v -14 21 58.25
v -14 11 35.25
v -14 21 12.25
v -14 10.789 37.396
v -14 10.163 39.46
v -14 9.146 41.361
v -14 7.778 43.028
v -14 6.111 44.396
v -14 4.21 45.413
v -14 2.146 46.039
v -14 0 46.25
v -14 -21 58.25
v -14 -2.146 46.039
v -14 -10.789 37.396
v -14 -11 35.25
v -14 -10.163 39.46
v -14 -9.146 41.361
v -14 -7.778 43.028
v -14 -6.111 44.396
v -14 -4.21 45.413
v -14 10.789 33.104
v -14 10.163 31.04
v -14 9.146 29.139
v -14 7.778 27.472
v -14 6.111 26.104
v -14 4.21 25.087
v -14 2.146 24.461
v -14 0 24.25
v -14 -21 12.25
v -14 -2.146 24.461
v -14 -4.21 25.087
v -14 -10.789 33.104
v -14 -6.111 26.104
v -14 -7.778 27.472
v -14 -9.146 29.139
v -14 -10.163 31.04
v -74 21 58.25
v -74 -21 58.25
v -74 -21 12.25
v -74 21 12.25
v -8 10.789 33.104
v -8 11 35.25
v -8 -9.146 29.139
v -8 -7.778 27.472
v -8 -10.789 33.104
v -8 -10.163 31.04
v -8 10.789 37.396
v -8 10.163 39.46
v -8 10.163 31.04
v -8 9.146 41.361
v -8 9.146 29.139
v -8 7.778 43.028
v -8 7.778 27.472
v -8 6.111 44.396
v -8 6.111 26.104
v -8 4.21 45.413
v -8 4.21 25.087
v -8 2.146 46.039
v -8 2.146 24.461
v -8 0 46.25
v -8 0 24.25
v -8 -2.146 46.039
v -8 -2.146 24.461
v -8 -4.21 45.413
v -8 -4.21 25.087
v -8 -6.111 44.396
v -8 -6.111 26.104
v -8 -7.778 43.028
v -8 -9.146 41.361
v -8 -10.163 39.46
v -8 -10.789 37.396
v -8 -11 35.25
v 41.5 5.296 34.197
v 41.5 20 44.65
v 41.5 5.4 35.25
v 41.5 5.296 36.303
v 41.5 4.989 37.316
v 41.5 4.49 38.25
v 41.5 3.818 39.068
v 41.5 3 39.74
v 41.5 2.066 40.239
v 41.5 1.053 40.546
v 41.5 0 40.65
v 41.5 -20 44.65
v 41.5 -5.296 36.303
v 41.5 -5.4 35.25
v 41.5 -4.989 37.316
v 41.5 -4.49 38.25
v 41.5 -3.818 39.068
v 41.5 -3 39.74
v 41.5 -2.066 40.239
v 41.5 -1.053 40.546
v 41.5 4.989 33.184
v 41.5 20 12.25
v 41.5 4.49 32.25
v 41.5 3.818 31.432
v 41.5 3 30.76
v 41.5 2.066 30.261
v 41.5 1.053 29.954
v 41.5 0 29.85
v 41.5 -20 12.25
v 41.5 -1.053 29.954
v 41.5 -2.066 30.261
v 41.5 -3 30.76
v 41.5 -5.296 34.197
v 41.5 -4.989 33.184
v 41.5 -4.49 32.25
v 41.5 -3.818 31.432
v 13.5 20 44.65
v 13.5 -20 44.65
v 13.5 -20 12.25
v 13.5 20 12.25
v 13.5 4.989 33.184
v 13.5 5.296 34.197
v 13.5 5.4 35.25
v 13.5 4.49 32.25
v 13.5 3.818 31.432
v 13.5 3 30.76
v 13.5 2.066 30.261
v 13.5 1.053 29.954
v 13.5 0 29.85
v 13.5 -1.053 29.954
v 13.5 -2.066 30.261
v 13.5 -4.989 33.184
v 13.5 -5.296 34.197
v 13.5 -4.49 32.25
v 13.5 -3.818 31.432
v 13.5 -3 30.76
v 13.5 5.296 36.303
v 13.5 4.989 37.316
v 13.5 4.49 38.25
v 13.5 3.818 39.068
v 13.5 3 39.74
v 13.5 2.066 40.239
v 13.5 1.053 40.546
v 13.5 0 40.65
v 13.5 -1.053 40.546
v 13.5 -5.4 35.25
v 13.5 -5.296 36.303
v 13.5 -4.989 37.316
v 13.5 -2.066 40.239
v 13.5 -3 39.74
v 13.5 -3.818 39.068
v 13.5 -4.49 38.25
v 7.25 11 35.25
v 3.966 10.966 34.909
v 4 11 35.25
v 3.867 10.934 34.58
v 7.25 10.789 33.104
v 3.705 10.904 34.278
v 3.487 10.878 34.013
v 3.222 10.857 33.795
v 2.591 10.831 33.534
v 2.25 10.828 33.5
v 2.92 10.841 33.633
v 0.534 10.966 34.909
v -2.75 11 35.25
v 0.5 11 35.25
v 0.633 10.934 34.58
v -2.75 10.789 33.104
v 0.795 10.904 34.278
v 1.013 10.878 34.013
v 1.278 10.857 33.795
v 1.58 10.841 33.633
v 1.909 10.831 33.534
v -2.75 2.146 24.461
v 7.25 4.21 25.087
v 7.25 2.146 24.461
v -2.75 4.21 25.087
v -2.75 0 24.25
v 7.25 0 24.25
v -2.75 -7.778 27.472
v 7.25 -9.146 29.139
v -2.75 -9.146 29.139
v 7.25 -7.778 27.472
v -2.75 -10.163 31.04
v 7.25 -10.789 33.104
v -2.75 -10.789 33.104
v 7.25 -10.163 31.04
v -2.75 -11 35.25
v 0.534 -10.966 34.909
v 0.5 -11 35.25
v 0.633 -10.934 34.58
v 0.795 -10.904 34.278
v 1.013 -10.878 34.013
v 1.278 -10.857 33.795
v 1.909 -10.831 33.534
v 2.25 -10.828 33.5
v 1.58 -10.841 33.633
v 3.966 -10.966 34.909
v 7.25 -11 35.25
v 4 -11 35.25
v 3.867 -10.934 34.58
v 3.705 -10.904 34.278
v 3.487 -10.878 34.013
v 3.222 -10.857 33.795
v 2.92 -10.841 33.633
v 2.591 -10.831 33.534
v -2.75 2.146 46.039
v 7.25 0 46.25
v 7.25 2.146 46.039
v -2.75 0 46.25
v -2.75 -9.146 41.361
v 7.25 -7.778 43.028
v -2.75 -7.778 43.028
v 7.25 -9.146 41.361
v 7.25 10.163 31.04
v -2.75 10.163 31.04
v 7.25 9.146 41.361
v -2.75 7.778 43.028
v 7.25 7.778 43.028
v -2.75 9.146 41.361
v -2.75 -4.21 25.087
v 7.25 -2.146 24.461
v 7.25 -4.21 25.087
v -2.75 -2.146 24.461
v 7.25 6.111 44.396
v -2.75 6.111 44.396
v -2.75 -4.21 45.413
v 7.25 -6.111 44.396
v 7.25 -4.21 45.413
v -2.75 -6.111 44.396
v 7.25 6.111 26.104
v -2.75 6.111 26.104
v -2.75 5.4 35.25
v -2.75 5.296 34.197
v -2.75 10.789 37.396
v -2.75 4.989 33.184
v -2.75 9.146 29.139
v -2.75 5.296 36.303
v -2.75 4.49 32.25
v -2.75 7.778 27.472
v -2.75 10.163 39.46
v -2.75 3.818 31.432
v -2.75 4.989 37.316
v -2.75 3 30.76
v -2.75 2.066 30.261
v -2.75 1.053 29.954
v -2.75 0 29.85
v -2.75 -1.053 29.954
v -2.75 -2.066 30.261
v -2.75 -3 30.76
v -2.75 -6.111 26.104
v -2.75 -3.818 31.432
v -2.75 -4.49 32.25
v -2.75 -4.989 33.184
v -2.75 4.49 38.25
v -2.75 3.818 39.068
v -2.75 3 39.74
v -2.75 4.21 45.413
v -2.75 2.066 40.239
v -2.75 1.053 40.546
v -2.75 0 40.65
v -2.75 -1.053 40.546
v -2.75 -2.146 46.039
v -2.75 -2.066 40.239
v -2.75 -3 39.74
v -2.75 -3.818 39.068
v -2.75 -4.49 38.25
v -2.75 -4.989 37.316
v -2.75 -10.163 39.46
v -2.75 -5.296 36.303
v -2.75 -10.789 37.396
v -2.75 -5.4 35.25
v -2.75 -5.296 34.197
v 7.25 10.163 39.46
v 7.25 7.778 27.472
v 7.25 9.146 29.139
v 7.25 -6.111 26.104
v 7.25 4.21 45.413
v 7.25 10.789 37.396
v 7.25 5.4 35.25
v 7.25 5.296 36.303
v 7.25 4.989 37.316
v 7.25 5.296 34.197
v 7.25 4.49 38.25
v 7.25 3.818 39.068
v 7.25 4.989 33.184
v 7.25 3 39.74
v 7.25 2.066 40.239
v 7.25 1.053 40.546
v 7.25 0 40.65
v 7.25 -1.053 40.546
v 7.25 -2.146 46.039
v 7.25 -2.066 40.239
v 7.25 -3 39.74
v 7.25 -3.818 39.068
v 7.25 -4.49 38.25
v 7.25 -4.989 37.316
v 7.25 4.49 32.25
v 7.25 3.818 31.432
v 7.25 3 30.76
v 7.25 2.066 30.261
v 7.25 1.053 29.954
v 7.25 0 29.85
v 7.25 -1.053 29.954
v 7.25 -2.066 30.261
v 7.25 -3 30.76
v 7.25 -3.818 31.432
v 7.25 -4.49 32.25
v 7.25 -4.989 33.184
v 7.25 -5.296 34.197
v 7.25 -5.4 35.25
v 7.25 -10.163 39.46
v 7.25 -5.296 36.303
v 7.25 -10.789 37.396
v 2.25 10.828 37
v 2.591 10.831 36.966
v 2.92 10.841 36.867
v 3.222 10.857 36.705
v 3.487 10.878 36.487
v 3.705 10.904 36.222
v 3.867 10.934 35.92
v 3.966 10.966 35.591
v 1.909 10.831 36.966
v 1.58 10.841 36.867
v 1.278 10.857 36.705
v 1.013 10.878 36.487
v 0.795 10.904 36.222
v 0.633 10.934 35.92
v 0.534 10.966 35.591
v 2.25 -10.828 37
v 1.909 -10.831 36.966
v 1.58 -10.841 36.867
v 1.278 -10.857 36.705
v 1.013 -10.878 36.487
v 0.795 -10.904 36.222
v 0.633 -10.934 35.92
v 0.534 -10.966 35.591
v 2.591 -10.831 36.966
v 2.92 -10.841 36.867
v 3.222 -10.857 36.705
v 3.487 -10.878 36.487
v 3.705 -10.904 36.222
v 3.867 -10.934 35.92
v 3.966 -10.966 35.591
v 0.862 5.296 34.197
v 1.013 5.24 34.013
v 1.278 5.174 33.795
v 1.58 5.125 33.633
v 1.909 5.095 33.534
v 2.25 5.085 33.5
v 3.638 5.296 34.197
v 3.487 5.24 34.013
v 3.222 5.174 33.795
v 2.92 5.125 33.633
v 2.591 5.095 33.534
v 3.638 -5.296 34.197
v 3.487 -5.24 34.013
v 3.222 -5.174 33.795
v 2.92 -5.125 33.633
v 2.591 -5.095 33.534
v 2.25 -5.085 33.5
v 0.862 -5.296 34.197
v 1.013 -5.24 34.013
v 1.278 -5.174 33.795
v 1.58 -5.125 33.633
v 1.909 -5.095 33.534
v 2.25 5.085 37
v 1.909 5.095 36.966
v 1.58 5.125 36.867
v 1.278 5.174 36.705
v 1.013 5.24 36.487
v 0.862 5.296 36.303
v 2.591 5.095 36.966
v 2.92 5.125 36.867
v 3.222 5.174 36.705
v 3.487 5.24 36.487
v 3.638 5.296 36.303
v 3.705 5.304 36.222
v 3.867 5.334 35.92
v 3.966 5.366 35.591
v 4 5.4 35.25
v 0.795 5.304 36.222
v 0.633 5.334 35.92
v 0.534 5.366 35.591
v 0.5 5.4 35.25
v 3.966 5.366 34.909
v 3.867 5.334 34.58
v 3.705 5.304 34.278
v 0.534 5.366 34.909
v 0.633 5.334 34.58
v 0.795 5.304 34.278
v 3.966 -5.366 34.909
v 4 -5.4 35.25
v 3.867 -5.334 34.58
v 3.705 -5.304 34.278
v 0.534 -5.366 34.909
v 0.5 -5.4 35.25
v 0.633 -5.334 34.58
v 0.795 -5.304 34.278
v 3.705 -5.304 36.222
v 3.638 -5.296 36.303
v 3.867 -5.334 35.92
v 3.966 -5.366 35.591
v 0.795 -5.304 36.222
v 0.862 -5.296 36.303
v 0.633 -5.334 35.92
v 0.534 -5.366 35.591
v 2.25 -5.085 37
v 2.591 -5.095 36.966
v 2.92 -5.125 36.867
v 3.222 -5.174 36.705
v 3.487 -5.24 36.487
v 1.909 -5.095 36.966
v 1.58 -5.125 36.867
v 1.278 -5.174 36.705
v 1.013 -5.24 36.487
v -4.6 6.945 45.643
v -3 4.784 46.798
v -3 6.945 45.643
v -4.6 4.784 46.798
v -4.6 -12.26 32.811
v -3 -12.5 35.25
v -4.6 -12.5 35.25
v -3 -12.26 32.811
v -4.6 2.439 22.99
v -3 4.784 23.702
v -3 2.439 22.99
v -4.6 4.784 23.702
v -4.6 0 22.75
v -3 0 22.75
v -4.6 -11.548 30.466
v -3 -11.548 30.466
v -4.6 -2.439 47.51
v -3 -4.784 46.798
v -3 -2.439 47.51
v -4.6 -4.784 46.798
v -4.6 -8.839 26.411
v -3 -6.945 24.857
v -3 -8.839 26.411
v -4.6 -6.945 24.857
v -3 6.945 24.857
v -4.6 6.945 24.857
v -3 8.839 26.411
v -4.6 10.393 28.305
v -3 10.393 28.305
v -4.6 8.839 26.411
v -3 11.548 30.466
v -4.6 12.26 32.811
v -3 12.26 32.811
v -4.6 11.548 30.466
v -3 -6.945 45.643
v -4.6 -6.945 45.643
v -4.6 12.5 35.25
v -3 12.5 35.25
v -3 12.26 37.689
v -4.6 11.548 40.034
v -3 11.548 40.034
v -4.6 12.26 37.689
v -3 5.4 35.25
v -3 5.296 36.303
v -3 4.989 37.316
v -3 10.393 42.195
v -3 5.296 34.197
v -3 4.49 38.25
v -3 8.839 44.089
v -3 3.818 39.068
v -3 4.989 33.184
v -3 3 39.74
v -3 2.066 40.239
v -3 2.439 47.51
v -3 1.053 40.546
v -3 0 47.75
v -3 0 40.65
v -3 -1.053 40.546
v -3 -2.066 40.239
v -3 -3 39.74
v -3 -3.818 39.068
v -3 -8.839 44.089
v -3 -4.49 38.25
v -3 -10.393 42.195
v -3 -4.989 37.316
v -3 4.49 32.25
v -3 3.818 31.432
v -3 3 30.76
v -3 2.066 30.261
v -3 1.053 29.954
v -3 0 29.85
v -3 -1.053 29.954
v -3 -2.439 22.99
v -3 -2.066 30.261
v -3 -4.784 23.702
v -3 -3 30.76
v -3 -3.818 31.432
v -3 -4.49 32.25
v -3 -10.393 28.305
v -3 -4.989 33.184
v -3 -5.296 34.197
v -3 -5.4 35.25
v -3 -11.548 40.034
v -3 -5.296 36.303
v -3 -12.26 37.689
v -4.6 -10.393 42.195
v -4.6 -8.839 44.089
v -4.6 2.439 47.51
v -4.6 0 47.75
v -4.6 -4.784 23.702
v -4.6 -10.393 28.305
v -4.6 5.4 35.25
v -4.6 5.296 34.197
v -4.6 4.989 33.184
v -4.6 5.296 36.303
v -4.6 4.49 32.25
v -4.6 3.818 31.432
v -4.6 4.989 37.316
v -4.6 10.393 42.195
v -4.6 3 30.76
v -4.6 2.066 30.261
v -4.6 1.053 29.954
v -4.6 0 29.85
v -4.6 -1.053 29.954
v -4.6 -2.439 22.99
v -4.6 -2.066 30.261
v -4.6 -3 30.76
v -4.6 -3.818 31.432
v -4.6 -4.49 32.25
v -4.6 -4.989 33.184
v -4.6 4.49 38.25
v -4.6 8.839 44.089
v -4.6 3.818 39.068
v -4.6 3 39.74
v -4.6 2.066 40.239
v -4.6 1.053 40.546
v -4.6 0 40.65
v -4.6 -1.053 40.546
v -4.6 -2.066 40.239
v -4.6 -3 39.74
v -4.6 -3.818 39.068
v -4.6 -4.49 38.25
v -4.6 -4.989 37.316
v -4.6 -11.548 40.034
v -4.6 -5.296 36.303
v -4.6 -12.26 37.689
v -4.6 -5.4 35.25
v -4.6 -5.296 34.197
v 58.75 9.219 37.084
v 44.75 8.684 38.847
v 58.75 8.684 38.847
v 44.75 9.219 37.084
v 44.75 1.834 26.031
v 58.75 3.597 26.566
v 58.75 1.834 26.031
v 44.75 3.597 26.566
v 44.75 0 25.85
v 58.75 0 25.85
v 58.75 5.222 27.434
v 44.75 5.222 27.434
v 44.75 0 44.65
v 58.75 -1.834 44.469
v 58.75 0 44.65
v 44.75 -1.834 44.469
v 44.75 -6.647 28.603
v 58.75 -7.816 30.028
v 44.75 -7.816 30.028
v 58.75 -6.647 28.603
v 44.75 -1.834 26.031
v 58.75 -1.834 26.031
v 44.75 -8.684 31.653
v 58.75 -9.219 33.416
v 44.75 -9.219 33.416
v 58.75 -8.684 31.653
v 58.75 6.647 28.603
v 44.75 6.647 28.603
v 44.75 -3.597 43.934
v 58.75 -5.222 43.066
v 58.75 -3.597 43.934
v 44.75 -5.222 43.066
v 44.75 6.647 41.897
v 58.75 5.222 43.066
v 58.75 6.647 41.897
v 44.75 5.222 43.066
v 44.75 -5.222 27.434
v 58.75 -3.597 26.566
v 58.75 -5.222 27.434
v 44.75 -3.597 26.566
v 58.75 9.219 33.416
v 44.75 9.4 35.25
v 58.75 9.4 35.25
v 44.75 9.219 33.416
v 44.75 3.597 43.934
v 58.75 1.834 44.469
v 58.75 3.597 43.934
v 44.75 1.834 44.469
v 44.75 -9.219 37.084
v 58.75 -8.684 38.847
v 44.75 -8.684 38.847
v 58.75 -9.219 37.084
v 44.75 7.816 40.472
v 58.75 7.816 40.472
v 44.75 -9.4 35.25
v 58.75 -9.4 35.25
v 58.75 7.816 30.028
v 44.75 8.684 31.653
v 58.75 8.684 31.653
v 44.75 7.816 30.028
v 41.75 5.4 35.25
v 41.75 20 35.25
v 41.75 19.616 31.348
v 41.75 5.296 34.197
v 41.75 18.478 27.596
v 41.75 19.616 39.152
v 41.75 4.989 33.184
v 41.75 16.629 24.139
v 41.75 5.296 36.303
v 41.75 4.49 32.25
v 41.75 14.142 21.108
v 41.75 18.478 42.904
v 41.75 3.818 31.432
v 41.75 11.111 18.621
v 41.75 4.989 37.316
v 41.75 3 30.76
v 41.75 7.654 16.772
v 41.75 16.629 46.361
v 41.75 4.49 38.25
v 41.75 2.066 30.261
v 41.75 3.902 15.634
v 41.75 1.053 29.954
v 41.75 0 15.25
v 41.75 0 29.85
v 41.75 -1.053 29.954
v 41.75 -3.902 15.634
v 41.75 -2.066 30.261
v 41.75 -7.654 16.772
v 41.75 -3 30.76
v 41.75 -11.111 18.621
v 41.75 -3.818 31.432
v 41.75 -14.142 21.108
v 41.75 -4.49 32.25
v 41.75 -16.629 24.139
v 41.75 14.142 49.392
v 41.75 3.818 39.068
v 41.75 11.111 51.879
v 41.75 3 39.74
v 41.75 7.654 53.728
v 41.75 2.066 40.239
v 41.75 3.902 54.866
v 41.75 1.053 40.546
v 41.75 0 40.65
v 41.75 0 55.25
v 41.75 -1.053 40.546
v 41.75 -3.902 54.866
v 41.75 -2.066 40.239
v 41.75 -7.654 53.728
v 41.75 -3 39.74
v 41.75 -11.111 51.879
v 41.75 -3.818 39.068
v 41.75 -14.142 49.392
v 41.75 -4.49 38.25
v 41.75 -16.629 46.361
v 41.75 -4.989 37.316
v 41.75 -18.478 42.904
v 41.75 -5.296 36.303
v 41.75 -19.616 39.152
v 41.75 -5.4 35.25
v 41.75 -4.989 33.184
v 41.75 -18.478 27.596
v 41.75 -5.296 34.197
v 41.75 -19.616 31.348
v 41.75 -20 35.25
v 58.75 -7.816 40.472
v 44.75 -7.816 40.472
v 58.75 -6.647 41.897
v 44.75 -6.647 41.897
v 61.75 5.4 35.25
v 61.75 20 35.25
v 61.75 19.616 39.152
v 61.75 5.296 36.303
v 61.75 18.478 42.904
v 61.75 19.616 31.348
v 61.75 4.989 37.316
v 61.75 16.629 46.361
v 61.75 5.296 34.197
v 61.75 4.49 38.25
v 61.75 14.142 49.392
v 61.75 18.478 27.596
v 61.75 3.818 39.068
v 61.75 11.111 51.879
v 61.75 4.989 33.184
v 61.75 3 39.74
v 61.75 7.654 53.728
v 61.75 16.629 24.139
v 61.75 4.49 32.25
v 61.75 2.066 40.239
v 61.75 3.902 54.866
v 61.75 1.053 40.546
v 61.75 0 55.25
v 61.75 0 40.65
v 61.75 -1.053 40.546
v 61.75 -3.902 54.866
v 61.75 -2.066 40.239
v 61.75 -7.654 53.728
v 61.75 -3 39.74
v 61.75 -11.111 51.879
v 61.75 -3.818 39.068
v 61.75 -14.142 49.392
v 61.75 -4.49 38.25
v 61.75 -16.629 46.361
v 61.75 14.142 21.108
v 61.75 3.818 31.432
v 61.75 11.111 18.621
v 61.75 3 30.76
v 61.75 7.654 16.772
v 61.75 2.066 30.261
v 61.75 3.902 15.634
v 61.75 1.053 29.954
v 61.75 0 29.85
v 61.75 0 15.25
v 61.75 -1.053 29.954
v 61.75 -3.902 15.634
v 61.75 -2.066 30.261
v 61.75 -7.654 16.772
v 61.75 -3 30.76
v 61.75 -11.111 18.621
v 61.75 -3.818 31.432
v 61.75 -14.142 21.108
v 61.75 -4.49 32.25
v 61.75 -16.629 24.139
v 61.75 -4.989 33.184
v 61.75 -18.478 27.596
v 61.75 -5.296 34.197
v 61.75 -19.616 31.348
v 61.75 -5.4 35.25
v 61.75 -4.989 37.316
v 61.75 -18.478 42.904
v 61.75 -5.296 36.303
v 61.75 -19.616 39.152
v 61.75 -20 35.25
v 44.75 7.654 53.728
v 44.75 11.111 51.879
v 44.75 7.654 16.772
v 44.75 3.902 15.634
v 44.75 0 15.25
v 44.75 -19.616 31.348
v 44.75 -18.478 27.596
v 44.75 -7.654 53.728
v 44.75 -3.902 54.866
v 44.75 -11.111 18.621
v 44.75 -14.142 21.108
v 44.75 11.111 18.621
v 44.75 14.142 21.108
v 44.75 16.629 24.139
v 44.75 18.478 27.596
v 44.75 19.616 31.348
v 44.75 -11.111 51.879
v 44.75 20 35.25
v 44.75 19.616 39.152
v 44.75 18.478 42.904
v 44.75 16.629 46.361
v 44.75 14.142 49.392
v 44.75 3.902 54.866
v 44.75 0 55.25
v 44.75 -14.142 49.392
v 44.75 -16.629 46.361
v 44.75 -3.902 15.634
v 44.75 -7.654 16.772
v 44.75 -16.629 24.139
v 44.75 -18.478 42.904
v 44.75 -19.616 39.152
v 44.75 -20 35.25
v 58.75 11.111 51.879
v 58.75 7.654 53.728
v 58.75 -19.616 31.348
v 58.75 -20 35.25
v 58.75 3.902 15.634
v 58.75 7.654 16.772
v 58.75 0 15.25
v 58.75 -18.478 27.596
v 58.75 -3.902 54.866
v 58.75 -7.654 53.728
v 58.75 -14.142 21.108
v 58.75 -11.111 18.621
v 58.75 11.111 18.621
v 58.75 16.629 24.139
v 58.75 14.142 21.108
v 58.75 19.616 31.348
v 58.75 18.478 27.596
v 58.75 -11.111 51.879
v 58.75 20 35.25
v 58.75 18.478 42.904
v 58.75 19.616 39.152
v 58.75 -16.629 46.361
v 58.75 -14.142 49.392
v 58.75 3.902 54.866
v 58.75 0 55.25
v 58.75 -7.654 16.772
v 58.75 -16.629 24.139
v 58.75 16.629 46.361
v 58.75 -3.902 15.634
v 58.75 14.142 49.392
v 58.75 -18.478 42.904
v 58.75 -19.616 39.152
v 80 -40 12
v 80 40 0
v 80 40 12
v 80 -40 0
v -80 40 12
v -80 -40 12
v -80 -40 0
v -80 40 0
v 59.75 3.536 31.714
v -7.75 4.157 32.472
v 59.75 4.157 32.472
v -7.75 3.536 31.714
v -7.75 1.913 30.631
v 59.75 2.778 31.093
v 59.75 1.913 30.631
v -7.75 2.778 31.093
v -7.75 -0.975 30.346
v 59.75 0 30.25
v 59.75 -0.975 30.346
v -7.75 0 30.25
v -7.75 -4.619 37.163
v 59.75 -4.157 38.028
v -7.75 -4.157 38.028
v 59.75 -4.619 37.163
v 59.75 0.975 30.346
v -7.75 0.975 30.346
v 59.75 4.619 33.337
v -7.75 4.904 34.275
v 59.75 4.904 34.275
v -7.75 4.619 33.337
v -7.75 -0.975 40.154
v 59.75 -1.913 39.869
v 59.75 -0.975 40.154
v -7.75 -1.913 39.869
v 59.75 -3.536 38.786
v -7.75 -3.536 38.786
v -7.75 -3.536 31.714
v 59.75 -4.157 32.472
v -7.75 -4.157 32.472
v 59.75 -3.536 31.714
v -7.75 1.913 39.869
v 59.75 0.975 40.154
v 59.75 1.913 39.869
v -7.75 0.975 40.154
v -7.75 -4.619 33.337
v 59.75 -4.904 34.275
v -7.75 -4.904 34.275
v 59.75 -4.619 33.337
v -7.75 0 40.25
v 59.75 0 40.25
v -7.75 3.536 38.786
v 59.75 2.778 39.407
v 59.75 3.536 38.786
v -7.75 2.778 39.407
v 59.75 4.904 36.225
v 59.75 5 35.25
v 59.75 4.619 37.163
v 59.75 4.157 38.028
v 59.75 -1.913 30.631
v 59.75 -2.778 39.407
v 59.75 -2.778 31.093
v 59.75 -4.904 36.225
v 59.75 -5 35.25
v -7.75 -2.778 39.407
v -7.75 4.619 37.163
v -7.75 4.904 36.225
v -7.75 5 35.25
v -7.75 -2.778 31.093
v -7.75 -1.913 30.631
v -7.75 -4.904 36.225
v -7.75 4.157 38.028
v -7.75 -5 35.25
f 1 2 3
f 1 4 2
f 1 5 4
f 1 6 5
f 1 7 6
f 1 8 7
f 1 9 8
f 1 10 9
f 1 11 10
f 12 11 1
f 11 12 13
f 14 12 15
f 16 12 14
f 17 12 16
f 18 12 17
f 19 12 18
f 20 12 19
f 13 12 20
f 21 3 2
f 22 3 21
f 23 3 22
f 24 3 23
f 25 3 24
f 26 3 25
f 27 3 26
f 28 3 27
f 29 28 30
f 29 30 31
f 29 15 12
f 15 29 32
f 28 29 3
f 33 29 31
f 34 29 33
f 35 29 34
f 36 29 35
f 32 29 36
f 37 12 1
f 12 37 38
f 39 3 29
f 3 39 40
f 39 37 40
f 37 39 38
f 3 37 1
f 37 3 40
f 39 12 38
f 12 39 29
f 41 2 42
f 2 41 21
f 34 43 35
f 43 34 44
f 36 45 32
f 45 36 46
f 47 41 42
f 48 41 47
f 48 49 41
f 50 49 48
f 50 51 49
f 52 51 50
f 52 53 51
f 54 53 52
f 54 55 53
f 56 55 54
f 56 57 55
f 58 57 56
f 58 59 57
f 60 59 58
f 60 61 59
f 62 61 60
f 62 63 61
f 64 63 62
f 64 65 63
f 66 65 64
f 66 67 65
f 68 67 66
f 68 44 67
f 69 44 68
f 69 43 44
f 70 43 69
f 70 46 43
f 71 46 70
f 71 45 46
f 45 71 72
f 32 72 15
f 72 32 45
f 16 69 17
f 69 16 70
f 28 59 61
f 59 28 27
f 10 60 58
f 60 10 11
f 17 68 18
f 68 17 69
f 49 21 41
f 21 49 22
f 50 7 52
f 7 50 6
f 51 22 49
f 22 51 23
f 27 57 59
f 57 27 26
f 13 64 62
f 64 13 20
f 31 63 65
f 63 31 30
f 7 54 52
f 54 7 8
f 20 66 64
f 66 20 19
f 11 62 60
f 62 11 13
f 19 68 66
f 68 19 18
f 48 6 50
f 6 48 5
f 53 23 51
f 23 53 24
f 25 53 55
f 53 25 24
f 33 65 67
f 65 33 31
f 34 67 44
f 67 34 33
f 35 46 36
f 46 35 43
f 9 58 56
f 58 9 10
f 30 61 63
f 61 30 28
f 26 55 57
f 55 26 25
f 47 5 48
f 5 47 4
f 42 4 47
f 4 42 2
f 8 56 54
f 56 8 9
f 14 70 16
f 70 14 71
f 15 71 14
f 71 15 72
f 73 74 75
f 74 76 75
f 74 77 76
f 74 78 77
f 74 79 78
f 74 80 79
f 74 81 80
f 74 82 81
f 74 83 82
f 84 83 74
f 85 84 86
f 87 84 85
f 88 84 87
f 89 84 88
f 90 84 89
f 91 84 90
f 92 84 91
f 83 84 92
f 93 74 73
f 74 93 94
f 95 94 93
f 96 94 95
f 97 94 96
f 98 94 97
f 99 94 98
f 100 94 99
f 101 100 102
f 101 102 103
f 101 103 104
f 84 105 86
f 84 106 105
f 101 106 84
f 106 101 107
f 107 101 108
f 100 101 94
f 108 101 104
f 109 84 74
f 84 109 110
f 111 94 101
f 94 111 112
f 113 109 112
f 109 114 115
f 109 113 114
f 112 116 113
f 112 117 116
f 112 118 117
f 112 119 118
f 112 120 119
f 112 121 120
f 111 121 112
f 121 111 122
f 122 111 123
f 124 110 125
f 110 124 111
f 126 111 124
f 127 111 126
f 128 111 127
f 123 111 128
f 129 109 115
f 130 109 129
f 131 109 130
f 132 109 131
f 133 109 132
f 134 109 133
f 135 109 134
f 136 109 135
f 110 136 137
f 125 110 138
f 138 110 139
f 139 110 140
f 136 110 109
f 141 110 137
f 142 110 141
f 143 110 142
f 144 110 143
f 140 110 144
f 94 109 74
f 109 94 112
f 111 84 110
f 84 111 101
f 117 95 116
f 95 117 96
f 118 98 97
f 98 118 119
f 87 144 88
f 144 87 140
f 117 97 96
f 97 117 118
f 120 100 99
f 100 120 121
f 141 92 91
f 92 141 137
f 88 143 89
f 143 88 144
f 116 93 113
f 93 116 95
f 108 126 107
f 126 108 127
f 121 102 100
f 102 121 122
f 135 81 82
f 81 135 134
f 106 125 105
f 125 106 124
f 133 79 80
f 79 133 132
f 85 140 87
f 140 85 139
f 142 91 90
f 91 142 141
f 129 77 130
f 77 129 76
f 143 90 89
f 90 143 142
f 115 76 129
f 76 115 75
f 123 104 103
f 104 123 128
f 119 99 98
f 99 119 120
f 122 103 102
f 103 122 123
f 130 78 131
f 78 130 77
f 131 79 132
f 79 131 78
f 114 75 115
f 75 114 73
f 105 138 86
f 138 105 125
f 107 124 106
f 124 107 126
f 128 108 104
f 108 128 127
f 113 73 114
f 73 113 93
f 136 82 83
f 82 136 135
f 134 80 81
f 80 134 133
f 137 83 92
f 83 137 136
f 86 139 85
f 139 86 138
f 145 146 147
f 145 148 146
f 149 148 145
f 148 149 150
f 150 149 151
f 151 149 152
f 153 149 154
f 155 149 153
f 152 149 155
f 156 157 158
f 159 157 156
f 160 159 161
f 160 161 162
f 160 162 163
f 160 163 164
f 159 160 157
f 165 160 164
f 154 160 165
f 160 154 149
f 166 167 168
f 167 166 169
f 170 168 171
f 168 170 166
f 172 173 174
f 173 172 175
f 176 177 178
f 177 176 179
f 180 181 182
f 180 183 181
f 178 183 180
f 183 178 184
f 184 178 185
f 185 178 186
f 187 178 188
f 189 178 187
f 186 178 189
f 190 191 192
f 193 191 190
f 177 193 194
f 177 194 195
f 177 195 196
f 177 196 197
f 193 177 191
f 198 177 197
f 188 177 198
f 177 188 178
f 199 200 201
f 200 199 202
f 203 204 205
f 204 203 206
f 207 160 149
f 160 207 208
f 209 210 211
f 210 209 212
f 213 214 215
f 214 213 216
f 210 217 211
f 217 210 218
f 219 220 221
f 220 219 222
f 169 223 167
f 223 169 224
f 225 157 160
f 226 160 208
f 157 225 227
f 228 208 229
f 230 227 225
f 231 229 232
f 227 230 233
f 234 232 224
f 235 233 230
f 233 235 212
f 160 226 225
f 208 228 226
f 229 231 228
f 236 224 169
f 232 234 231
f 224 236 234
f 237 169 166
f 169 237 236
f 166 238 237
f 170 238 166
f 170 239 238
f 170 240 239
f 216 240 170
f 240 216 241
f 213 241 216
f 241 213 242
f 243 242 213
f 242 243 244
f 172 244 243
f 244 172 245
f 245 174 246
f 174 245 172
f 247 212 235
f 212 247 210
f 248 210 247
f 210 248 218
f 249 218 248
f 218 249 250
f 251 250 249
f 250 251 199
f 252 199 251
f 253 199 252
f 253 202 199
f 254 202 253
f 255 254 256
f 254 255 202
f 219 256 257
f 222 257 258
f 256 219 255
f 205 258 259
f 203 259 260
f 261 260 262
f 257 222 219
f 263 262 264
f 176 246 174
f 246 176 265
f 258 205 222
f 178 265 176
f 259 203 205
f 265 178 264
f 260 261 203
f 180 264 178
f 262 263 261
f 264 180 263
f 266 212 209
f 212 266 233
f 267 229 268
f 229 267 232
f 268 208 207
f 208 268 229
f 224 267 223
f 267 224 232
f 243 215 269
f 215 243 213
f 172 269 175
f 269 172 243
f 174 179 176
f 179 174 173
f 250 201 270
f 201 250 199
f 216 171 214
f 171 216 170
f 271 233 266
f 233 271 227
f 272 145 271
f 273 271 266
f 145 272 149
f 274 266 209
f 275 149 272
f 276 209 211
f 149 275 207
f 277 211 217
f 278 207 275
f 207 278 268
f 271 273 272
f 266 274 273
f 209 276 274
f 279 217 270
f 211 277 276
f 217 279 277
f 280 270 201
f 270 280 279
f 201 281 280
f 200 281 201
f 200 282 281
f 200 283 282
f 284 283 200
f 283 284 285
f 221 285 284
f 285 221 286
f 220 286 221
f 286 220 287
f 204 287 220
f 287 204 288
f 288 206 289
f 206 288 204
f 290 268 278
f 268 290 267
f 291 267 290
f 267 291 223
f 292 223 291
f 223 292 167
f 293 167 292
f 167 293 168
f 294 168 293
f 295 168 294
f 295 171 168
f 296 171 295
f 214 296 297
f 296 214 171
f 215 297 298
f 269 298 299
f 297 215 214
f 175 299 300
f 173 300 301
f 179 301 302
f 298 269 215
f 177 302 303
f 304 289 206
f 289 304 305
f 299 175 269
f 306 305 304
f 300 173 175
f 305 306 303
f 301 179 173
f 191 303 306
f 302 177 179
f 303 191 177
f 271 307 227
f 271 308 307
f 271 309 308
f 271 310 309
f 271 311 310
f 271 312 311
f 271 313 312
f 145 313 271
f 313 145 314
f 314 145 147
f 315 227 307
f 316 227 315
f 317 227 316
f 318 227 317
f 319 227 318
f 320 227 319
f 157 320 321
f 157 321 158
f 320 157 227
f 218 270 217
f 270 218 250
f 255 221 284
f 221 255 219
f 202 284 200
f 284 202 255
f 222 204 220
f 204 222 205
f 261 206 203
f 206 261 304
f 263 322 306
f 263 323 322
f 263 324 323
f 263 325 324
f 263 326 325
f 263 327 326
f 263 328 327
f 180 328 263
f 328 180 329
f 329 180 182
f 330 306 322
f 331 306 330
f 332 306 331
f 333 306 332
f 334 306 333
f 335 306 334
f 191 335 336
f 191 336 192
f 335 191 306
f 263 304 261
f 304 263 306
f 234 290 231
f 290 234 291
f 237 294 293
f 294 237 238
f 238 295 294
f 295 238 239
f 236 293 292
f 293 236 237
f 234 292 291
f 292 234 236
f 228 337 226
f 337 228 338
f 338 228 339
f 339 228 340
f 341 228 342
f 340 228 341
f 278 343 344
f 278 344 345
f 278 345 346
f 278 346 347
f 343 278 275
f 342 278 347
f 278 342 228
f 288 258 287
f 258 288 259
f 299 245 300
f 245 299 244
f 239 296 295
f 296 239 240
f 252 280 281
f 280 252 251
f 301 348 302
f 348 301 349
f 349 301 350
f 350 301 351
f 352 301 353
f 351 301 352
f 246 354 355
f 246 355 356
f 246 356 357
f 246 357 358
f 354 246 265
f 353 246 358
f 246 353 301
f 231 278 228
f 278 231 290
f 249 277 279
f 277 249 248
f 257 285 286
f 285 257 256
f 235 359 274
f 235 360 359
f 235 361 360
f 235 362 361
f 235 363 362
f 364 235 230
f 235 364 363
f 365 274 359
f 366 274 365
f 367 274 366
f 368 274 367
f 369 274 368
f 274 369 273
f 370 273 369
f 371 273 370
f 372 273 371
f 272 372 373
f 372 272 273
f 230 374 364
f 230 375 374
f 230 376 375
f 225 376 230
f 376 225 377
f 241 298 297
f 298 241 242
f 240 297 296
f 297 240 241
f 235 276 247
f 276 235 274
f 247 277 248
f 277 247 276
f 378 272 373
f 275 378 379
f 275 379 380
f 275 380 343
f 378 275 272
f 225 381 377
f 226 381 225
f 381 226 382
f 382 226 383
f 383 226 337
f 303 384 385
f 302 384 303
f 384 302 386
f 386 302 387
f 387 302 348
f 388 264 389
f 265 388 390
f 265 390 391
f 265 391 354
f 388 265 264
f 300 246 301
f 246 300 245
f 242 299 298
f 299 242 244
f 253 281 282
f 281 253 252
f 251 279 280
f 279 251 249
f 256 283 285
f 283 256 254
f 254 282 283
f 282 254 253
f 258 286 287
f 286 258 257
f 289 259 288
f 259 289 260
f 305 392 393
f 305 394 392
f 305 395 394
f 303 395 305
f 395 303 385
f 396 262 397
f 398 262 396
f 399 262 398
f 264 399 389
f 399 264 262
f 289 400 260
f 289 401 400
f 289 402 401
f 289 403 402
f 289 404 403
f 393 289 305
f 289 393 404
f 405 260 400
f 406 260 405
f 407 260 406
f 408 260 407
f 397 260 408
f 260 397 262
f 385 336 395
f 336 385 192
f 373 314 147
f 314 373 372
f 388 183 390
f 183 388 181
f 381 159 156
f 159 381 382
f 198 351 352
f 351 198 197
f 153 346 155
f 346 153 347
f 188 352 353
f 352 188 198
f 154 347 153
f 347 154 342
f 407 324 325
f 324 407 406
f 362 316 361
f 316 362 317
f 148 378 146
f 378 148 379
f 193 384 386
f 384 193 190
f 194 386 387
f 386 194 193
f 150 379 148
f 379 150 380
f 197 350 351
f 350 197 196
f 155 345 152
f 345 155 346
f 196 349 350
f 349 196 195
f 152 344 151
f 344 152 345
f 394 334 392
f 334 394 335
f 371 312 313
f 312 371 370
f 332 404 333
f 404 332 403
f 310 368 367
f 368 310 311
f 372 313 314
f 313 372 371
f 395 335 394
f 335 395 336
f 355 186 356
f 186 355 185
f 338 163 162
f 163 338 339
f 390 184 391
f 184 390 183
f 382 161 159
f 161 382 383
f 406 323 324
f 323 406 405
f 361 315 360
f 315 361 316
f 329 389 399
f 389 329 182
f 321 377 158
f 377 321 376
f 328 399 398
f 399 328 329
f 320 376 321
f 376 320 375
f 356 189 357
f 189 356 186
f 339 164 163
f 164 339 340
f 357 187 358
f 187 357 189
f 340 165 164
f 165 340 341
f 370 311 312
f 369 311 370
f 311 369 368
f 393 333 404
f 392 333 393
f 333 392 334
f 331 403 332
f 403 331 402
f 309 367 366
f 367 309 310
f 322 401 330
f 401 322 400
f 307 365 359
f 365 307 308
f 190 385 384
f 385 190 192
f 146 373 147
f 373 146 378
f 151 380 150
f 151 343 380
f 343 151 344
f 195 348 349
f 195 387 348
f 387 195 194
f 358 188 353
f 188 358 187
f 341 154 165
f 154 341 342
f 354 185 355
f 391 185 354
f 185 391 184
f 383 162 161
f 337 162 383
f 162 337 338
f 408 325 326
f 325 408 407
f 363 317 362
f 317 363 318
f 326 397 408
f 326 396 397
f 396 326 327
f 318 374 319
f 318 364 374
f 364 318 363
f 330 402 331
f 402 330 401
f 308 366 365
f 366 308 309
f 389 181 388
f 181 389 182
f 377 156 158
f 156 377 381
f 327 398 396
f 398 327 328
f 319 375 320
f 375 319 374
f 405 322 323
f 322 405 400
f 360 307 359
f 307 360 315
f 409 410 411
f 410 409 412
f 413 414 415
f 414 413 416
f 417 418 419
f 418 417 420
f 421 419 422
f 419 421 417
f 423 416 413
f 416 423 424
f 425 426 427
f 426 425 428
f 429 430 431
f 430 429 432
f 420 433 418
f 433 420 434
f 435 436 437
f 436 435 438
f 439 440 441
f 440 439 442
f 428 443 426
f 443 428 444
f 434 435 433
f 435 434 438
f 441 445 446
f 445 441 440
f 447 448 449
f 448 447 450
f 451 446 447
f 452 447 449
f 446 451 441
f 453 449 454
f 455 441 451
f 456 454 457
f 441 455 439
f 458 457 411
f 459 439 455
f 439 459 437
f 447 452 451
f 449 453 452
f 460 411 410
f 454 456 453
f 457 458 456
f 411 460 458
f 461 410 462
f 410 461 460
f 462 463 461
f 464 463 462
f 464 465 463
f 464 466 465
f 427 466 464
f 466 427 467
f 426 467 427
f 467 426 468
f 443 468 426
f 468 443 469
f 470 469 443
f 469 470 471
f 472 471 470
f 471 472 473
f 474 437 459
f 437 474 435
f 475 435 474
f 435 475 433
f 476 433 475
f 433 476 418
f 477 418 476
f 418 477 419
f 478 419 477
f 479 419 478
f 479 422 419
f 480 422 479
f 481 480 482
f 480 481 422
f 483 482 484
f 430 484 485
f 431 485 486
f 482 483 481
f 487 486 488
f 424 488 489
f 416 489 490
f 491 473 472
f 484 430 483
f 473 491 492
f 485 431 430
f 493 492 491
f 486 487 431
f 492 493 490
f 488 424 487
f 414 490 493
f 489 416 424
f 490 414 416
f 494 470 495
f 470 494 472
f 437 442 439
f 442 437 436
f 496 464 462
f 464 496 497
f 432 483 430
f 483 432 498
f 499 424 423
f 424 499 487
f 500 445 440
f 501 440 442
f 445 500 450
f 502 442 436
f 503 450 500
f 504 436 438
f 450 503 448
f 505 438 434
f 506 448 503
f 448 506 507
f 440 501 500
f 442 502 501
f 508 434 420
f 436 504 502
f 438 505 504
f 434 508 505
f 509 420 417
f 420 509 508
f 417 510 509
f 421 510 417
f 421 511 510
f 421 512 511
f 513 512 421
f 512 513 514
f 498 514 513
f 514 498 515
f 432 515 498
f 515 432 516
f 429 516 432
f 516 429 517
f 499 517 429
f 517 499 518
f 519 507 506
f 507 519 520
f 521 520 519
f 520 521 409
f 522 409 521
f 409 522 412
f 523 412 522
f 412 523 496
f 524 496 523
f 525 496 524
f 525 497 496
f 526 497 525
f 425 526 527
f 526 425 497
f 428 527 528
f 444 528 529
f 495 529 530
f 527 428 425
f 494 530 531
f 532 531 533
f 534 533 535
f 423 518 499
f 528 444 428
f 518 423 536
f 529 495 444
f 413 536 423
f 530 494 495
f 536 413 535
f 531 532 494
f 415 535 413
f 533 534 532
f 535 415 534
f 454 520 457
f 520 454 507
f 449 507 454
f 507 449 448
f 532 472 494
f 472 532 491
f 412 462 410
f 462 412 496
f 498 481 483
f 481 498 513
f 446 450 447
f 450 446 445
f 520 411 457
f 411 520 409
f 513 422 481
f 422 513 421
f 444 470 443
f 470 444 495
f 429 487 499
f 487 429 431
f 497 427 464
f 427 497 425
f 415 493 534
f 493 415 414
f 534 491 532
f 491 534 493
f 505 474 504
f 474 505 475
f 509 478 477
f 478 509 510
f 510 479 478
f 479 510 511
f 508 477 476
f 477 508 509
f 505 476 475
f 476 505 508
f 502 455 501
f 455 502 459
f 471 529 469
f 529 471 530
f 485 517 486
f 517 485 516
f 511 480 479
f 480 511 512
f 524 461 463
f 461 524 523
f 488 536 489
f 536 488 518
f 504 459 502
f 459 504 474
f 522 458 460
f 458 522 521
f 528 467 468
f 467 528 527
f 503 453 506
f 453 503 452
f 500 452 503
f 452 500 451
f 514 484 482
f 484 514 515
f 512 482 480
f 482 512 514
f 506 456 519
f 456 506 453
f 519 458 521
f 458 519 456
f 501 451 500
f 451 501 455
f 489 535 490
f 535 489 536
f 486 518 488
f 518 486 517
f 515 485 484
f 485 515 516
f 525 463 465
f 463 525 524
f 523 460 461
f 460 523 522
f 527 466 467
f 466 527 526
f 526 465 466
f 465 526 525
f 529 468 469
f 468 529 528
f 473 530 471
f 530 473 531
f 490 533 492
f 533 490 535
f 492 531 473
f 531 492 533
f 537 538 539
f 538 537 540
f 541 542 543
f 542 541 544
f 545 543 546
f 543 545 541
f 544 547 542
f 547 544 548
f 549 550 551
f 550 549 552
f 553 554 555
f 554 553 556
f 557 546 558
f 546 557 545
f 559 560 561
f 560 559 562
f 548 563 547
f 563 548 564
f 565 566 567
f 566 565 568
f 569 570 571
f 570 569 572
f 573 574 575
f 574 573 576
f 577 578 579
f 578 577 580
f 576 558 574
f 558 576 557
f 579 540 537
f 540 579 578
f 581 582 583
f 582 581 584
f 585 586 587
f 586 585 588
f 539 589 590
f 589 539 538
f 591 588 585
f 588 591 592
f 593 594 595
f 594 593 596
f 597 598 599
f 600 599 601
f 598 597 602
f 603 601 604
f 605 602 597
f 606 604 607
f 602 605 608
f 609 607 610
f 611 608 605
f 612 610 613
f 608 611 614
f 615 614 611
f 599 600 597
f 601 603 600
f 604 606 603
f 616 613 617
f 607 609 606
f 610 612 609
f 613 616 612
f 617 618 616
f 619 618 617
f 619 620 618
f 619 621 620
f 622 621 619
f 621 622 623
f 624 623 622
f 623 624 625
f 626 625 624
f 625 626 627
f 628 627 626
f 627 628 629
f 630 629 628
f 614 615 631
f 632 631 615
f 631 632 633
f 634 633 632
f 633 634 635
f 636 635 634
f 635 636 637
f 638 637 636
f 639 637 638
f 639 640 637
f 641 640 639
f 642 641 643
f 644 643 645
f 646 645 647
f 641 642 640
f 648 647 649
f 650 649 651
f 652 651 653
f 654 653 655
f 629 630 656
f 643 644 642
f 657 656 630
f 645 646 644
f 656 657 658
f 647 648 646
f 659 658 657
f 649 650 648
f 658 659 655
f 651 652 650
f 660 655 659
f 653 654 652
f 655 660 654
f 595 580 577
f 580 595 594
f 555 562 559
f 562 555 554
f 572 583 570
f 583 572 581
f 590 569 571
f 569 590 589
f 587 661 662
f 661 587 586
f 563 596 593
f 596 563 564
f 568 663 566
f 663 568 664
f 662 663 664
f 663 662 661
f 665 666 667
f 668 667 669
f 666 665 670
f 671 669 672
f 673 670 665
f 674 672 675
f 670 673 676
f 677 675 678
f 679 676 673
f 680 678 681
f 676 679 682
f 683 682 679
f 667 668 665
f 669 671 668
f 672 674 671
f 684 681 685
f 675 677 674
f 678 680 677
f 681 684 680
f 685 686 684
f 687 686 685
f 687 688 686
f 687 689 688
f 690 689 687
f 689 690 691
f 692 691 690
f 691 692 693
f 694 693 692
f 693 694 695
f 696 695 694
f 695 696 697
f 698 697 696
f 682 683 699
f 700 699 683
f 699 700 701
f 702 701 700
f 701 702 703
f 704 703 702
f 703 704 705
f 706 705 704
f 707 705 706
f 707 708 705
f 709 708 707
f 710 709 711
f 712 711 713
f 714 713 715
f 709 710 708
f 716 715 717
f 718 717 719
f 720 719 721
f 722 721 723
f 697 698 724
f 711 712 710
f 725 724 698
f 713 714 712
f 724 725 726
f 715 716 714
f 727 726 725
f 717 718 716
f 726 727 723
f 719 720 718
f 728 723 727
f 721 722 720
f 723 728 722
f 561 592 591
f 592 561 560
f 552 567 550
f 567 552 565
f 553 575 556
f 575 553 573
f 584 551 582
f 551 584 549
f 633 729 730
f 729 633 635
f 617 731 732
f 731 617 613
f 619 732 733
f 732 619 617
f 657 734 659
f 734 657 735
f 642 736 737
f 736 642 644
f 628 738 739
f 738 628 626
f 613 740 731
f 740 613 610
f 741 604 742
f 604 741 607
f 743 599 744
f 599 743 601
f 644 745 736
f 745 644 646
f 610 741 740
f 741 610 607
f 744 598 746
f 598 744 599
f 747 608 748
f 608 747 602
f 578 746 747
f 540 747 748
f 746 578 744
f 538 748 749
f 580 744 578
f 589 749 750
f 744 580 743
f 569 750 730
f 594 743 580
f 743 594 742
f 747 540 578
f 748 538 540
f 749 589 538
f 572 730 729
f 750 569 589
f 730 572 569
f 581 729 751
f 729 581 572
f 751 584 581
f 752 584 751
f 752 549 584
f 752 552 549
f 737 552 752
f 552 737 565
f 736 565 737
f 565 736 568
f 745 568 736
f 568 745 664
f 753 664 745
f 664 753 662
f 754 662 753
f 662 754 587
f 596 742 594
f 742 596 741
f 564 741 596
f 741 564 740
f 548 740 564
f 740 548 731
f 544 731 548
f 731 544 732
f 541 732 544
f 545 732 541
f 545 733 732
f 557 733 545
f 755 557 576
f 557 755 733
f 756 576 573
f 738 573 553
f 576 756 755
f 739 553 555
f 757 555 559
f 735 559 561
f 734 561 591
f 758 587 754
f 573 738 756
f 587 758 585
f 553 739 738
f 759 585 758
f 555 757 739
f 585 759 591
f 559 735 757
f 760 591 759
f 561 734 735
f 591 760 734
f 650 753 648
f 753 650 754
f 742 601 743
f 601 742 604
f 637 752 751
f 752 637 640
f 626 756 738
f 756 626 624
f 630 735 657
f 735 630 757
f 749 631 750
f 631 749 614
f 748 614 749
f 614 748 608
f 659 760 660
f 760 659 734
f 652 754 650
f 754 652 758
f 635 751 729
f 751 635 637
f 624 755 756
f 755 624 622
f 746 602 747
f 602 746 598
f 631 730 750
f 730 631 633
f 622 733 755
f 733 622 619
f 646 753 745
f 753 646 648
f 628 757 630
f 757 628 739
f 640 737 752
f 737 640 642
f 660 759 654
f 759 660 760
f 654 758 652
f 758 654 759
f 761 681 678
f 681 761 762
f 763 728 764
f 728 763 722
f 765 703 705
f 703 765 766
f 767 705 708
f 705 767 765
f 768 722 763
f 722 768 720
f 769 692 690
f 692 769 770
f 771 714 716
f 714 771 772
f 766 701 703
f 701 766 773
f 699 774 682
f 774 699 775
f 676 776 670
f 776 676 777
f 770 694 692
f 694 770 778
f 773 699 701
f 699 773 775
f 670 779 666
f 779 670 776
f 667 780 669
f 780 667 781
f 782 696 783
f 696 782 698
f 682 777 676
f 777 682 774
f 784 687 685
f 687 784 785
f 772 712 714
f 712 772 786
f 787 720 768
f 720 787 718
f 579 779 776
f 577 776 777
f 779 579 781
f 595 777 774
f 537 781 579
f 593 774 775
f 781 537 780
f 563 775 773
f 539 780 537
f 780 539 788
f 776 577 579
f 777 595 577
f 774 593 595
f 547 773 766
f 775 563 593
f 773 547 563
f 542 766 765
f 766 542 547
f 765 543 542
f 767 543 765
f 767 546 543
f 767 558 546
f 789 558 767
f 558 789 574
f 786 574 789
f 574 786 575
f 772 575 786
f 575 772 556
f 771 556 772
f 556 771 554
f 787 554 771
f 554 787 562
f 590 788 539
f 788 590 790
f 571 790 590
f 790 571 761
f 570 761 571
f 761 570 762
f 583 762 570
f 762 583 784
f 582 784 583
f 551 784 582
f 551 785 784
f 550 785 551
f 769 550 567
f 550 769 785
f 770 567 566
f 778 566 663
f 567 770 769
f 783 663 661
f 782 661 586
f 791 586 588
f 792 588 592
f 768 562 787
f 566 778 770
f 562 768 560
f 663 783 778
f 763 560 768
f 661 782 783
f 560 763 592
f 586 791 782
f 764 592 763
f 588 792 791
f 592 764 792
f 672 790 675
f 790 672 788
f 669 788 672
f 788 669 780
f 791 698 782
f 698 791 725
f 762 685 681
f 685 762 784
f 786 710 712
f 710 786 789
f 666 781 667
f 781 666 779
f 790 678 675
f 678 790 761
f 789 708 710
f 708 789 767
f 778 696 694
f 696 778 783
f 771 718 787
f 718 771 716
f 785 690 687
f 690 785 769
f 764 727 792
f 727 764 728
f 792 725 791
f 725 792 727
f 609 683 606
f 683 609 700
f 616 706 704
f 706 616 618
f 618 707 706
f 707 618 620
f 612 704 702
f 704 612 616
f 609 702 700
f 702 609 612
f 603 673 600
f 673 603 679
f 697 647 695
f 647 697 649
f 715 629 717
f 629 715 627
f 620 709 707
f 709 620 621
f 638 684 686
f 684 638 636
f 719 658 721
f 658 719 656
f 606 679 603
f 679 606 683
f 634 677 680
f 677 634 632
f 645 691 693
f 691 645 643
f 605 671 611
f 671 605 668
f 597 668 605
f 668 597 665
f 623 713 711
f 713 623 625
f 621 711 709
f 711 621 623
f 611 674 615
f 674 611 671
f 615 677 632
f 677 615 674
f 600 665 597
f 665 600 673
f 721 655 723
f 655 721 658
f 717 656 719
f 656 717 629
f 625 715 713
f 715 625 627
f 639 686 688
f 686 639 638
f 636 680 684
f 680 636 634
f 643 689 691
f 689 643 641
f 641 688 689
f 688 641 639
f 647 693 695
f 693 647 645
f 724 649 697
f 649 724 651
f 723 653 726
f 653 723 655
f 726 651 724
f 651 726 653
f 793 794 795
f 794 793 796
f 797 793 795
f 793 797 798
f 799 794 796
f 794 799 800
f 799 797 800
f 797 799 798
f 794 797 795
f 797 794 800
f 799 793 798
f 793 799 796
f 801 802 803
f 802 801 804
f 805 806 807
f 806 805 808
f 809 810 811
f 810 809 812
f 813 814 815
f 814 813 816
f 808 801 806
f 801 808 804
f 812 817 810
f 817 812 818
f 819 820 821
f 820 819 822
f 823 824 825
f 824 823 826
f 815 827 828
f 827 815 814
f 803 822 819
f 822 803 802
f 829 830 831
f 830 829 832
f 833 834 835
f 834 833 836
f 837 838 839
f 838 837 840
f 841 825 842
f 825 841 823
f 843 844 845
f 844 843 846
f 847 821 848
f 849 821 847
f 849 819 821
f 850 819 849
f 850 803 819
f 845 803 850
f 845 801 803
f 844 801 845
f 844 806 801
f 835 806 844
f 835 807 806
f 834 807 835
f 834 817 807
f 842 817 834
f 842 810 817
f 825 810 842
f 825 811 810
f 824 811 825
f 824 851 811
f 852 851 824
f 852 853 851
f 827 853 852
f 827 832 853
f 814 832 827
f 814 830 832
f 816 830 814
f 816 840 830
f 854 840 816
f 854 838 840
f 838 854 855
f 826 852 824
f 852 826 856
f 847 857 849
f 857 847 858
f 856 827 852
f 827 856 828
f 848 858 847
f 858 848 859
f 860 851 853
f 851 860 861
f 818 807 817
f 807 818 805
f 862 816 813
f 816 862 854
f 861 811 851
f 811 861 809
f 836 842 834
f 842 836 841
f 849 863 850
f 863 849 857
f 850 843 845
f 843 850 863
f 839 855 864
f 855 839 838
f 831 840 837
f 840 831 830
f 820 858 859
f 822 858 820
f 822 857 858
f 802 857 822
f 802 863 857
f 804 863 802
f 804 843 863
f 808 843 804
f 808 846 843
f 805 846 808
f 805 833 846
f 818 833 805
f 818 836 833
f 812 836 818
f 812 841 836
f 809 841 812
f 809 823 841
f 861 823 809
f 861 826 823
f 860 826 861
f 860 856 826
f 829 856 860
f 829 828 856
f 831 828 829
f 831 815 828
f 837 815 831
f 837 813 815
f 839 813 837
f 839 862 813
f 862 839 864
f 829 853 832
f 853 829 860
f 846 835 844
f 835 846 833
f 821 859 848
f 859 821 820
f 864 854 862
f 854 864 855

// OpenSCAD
$fn = 32;

// ------------------------------------------------------------------------
// Motor drive station: motor 60 x 46 mm, shaft d10, pulley d40
// Every part is its own module, assembly() places every instance.
// ------------------------------------------------------------------------

// --- part 1 ---
module station_bed() {
  difference() {
    translate([-80, -40, 0]) cube([160, 80, 12]);
  }
}

// --- part 2 ---
module drive_motor() {
  union() {
    translate([-30, -21, 0]) cube([60, 42, 46]);
    translate([33, 0, 23]) rotate([0, 90, 0]) cylinder(h = 6, d = 22, center = true);
  }
}

// --- part 3 ---
module pillow_block() {
  difference() {
    translate([-14, -20, 0]) cube([28, 40, 32.4]);
    translate([0, 0, 23]) rotate([0, 90, 0]) cylinder(h = 30, d = 10.8, center = true);
  }
}

// --- part 4 ---
module drive_shaft() {
  translate([0, 0, -33.75]) cylinder(h = 67.5, d = 10);
}

// --- part 5 ---
module shaft_collar() {
  difference() {
    cylinder(h = 10, d = 22);
    translate([0, 0, -1]) cylinder(h = 12, d = 10.8);
    translate([0, 0, 5]) rotate([90, 0, 0]) cylinder(h = 24, d = 3.5, center = true);
  }
}

// --- part 6 ---
module collar_washer() {
  difference() {
      translate([0, 0, 0]) cylinder(h = 1.6, d = 25);
      translate([0, 0, -1]) cylinder(h = 3.6, d = 10.8);
    }
}

// --- part 7 ---
module drive_pulley() {
  difference() {
    union() {
      cylinder(h = 20, d = 18.8);
      cylinder(h = 3, d = 40);
      translate([0, 0, 17]) cylinder(h = 3, d = 40);
    }
    translate([0, 0, -1]) cylinder(h = 22, d = 10.8);
  }
}

// --- assembly ---
module assembly() {
  color([0.80, 0.24, 0.20]) translate([0, 0, 0]) rotate([0, 0, 0]) station_bed();
  color([0.20, 0.45, 0.75]) translate([-44, 0, 12.25]) rotate([0, 0, 0]) drive_motor();
  color([0.25, 0.62, 0.32]) translate([27.5, 0, 12.25]) rotate([0, 0, 0]) pillow_block();
  color([0.92, 0.70, 0.18]) translate([26, 0, 35.25]) rotate([0, 90, 0]) drive_shaft();
  color([0.58, 0.35, 0.70]) translate([-2.75, 0, 35.25]) rotate([0, 90, 0]) shaft_collar();
  color([0.16, 0.66, 0.66]) translate([-4.6, 0, 35.25]) rotate([0, 90, 0]) collar_washer();
  color([0.85, 0.48, 0.18]) translate([41.75, 0, 35.25]) rotate([0, 90, 0]) drive_pulley();
}

assembly();
